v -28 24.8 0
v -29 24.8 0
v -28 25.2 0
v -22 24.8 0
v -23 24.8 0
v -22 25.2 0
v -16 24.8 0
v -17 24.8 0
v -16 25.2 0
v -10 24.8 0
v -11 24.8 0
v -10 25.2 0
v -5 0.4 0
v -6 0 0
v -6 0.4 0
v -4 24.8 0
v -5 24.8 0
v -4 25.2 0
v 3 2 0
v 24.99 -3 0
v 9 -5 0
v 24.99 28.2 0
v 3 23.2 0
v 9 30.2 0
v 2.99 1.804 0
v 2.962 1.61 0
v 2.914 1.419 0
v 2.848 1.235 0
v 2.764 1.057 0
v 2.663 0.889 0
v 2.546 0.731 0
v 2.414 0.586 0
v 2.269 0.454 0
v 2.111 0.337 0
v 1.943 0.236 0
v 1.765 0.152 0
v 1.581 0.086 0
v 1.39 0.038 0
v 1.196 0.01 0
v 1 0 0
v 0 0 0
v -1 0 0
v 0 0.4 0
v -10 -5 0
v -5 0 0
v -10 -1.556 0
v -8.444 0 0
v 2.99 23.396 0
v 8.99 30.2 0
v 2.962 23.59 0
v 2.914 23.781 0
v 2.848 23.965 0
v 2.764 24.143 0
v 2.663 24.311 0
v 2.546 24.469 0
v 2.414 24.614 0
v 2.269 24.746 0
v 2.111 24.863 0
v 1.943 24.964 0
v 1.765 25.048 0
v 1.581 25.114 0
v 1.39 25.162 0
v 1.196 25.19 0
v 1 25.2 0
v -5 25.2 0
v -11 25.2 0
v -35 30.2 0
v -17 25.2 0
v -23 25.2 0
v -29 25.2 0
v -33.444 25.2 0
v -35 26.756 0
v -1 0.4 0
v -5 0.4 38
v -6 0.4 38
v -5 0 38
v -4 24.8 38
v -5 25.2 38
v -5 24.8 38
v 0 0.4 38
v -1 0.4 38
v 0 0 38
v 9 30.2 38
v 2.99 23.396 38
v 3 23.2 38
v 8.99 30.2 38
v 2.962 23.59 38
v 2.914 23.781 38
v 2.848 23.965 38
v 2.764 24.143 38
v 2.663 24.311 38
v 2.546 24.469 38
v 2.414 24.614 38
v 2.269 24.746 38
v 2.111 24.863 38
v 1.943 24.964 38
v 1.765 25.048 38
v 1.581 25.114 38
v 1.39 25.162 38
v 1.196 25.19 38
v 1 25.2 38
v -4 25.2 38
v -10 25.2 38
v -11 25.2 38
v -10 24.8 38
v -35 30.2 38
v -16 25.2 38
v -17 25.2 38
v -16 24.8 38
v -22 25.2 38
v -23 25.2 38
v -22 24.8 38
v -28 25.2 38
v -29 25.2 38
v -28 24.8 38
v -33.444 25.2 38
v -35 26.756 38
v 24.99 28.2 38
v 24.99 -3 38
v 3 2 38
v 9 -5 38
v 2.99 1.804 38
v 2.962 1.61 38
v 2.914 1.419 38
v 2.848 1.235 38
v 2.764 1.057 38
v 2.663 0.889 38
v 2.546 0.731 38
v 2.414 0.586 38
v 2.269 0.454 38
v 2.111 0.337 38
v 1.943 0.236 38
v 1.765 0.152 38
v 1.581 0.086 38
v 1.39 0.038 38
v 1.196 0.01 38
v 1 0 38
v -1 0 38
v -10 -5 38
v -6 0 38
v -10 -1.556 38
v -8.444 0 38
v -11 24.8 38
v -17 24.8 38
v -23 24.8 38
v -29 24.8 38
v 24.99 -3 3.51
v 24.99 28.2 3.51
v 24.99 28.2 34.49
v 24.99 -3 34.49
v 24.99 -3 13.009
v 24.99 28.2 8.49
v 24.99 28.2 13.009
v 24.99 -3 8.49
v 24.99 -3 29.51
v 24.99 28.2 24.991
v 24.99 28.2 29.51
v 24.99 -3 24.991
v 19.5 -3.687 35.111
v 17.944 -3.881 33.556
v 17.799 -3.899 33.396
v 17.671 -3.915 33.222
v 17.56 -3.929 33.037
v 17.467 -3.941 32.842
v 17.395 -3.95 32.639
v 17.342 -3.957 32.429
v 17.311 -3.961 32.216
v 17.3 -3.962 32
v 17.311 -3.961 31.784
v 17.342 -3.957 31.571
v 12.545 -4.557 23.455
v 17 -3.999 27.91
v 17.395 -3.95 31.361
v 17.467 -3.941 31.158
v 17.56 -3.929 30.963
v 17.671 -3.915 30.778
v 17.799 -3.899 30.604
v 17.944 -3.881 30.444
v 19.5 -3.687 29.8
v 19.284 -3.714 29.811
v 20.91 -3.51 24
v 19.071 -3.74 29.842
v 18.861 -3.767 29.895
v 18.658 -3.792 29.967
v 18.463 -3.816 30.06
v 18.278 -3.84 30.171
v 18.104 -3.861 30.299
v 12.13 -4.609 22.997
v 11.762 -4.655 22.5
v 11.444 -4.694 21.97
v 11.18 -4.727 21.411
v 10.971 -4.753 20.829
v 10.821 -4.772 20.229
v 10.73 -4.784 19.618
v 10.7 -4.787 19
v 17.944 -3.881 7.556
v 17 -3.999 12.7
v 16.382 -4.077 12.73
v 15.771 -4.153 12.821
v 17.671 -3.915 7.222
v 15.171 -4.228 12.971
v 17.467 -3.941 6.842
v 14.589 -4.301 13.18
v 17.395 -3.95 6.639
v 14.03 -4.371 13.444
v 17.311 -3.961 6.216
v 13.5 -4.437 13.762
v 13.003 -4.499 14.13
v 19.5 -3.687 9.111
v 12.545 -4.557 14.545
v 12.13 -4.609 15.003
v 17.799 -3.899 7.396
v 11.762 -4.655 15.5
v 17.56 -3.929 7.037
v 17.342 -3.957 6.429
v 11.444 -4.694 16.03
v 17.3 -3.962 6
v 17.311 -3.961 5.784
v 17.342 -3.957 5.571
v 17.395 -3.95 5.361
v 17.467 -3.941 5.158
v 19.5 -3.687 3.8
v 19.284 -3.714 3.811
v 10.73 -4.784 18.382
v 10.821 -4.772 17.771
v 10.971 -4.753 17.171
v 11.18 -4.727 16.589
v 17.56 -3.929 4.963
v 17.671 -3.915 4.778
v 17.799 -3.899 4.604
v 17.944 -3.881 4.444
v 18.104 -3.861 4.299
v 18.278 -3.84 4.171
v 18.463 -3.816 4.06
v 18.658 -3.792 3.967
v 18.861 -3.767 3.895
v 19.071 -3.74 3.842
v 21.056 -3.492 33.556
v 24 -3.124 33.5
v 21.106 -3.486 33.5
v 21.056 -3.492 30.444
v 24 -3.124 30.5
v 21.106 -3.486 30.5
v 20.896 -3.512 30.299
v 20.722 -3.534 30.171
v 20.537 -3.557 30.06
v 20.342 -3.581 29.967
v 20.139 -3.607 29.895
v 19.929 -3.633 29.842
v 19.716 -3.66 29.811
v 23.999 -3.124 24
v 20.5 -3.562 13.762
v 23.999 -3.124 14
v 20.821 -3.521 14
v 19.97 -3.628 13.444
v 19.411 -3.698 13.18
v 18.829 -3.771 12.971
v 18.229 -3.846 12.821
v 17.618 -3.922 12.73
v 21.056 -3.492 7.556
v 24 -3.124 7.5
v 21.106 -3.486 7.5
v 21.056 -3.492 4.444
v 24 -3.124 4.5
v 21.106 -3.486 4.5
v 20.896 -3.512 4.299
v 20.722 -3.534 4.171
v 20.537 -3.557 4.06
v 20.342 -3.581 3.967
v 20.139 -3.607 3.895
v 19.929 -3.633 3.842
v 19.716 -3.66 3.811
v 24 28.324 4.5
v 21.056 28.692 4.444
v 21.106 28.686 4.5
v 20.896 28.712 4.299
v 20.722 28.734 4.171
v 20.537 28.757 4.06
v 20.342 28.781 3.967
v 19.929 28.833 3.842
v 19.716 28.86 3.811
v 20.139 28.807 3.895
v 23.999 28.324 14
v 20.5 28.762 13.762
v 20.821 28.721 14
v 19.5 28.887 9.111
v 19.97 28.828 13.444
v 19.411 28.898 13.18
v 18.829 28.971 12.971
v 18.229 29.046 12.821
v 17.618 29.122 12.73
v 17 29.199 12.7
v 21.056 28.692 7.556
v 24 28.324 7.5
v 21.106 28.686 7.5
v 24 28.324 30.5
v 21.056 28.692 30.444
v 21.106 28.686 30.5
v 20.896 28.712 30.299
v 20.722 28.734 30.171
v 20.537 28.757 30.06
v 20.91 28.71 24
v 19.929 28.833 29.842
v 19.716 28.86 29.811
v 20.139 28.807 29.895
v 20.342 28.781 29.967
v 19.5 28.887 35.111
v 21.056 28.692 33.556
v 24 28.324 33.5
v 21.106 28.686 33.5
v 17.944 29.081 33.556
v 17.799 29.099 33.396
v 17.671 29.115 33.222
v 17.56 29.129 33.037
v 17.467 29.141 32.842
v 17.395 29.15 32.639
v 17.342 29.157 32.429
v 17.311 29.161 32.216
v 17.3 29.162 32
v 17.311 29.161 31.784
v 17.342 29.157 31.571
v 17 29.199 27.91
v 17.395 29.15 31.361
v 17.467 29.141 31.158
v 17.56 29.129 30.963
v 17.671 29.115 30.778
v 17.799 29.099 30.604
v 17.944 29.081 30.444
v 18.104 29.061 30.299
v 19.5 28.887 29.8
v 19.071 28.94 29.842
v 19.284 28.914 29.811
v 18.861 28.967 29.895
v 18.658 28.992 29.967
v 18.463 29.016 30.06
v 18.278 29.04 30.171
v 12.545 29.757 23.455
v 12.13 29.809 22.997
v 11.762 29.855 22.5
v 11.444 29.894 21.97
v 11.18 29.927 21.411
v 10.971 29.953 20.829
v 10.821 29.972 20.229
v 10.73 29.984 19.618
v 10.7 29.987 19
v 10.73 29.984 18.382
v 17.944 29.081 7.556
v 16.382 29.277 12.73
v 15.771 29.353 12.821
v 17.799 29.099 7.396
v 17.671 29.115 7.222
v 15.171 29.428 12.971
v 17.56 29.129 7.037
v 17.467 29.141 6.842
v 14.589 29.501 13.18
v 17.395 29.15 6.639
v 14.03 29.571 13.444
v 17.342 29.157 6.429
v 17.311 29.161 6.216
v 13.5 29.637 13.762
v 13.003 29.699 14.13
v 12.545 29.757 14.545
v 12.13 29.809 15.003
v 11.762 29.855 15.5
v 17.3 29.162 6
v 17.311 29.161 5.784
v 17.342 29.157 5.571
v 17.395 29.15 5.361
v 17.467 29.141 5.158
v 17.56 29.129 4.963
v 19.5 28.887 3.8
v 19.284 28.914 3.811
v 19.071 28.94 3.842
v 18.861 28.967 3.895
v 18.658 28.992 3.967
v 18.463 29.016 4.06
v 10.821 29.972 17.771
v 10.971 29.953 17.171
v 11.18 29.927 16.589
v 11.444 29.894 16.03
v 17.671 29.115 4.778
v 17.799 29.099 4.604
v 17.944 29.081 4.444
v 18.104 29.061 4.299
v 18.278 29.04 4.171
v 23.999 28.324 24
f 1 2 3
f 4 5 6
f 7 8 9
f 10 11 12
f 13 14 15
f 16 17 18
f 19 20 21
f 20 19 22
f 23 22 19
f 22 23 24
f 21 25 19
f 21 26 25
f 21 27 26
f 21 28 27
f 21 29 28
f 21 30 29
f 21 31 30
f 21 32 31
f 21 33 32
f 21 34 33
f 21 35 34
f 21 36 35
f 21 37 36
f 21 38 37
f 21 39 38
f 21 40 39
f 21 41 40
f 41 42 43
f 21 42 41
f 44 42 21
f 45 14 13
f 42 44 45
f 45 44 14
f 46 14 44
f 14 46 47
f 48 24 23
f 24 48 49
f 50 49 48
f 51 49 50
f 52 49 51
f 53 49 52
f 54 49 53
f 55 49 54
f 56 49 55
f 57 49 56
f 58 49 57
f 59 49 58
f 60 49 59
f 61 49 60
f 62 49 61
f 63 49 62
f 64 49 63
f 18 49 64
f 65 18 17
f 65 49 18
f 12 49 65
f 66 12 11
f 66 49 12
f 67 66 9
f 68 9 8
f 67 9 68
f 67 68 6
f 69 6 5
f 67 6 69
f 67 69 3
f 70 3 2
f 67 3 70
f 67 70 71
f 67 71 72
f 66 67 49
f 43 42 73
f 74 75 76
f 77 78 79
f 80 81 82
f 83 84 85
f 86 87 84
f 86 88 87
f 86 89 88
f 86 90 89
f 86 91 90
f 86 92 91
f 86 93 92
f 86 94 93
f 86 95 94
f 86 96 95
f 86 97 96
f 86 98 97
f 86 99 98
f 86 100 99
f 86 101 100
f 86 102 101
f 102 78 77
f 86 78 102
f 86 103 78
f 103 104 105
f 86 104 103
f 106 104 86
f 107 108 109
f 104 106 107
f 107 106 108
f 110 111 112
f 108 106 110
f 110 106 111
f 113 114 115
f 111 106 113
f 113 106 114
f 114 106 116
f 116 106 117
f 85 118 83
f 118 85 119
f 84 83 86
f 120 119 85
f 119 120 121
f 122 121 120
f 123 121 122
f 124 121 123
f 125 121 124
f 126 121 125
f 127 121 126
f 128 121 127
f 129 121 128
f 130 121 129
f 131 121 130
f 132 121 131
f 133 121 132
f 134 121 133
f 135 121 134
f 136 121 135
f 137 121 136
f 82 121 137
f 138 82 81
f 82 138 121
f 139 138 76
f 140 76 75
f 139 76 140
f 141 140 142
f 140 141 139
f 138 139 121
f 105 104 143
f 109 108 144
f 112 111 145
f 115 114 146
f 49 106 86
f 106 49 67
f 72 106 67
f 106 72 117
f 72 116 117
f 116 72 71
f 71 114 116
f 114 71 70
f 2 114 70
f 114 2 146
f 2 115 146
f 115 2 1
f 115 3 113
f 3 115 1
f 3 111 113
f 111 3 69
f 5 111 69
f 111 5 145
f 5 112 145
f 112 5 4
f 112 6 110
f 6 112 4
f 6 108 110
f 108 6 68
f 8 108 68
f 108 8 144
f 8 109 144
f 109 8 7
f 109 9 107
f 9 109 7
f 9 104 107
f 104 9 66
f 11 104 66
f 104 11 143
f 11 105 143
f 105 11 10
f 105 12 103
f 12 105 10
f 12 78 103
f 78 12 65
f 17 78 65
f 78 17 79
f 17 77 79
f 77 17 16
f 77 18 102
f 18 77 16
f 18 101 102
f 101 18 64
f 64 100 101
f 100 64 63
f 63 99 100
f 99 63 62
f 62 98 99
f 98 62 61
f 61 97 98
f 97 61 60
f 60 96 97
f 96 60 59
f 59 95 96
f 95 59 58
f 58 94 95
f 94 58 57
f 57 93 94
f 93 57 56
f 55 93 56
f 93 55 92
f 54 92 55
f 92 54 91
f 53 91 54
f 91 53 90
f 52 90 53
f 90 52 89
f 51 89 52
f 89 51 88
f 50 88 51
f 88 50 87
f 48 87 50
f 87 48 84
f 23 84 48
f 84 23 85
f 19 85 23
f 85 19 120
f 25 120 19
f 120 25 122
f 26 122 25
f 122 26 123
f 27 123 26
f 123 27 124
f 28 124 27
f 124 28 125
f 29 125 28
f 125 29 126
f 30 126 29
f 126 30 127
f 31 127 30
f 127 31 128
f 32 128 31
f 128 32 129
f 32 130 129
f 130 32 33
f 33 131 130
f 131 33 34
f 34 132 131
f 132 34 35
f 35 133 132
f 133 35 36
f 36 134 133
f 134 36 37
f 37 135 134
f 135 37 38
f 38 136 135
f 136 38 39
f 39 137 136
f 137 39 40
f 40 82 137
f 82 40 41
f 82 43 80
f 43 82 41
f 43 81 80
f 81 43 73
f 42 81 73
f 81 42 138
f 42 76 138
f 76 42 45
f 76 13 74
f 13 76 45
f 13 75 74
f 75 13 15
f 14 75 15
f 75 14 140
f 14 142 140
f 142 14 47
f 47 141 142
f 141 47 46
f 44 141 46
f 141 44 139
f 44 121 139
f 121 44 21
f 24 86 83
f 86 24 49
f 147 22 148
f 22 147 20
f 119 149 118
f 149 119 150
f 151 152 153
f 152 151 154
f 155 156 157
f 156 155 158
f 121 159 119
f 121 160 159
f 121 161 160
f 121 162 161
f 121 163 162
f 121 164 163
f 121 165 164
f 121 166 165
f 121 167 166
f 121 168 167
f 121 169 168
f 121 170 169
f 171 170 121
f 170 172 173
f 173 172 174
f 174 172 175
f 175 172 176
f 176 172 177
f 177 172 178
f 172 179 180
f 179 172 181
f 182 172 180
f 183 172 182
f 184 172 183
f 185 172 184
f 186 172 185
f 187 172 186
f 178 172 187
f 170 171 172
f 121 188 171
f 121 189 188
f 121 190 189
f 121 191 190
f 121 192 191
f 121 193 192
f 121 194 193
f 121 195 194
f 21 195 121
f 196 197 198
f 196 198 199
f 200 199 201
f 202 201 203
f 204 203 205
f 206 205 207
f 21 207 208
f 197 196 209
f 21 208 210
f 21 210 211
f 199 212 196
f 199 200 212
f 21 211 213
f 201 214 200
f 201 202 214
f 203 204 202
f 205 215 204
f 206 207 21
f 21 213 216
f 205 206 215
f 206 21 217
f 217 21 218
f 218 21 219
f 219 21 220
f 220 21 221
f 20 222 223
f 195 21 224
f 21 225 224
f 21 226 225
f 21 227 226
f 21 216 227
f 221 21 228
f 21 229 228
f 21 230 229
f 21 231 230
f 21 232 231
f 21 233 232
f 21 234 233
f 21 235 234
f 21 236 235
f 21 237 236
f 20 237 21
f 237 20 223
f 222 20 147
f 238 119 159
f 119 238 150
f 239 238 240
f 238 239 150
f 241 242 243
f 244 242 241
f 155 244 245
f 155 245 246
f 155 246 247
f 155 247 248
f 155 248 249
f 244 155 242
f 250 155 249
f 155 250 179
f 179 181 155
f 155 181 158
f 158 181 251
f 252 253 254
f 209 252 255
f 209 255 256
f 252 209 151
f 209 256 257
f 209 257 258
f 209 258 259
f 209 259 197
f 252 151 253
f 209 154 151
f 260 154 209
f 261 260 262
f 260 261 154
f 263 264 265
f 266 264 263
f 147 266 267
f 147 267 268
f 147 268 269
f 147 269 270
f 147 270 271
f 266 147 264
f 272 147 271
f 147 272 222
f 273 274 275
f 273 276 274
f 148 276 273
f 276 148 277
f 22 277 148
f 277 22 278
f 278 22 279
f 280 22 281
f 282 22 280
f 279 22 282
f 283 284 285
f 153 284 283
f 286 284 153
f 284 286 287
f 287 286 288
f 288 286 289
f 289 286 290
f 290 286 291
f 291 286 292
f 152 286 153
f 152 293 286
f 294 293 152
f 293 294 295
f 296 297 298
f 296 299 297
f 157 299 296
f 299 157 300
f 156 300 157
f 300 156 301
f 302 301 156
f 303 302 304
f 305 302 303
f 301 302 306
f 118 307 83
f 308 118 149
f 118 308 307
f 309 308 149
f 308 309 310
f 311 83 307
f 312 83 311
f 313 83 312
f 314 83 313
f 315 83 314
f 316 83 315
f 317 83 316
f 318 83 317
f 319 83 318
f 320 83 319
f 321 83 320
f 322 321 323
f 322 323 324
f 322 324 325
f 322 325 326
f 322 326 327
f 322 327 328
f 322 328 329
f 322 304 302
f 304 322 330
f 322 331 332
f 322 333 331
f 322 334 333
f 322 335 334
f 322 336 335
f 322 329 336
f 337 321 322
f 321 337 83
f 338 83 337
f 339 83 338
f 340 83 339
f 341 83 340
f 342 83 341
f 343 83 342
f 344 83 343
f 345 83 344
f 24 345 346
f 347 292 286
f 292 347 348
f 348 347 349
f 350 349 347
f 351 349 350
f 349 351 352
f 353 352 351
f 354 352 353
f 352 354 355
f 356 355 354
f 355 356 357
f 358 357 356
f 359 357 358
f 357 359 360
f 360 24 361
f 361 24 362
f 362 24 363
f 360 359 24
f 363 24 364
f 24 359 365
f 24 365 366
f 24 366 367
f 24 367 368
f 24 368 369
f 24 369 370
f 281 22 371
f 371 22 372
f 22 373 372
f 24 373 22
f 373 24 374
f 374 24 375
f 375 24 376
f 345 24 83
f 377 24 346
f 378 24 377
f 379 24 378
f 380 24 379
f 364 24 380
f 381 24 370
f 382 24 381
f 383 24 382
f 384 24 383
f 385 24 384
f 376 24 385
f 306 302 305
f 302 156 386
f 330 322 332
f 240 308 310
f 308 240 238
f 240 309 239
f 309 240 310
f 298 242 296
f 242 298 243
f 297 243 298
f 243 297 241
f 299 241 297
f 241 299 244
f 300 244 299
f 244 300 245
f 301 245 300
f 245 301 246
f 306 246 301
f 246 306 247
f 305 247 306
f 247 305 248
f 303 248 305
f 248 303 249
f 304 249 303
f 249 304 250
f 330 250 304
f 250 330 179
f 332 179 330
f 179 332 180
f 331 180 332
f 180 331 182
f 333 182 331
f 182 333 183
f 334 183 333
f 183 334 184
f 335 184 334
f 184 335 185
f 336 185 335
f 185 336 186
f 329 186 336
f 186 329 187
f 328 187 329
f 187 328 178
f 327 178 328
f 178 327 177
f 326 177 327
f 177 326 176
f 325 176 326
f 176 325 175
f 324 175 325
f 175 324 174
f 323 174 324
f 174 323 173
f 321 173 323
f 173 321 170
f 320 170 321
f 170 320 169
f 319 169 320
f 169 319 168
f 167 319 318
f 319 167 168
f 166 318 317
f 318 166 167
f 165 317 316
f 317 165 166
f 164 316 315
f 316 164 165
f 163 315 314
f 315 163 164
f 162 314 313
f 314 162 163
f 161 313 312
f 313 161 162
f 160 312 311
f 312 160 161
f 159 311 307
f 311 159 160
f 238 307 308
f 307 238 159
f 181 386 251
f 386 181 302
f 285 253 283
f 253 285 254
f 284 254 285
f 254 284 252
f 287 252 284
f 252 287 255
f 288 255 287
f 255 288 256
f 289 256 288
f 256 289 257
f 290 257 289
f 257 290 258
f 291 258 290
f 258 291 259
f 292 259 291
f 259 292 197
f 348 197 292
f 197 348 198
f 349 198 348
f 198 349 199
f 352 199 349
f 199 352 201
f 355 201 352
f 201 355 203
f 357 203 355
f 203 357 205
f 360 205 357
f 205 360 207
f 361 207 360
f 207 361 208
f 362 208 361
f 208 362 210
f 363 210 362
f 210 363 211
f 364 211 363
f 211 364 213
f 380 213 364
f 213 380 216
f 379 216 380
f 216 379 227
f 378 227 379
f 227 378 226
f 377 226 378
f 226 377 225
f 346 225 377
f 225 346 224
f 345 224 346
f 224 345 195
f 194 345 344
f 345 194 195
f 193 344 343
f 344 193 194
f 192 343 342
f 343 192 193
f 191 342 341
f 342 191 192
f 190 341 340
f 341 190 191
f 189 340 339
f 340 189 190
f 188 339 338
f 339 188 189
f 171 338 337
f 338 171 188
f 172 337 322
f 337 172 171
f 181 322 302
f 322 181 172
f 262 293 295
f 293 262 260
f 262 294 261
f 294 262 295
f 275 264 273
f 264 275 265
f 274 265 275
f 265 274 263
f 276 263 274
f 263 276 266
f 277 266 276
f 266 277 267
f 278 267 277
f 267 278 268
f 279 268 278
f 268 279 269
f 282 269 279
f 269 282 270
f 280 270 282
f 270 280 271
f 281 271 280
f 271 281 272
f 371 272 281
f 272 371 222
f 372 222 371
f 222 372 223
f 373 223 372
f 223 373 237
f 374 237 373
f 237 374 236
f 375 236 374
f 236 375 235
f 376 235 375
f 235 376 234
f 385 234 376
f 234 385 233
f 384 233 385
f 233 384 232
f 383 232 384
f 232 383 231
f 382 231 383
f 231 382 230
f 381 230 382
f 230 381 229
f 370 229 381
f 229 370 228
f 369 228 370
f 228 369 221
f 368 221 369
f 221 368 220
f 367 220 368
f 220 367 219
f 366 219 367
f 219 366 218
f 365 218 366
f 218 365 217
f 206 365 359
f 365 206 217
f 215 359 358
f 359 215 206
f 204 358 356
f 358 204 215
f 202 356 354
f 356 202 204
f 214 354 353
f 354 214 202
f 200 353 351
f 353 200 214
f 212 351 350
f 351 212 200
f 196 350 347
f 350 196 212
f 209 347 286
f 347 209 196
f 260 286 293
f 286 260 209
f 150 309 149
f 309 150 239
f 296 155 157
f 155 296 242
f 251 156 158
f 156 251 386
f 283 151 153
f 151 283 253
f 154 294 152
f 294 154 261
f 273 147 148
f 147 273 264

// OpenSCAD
// Edge cable clip (2026-11-10, polished V1 = V2 built in). Pushes onto a tabletop edge
// (no tape, no screws): spring C-clamp with 0.8 mm preload, chamfered jaw tips to slide on,
// grip ribs inside, 2 mm inner fillets (PLA corner strength). Snap-in channels on the outside
// hold the cables where they drop over the edge; the plugs can't pass, so they stay on top.
// Default: 26 mm edge, 2 thin cables (USB-C, monitor) + 1 x 12 mm extension cord.
// Prints LYING ON ITS SIDE (C profile flat) so layers run around the C: no supports.
//   p3d slice edge_cable_clip.stl -f pla --walls 4 --infill 40 --keep-orient
$fn = 64;
part  = "print";   // "print" | "use" (as mounted)
T     = 26;        // edge thickness (calipers)
pre   = 0.8;       // clamp preload
jaw   = 5;         // jaw thickness
top_d = 35;        // top jaw reach onto the table
bot_d = 10;        // bottom jaw reach under the top
gap_x = 3;         // clearance in front of the (rounded) edge
sp    = 6;         // spine thickness
small = 4.4;  small_in = 3.0;    // thin cable channel / snap opening
big   = 12.6; big_in   = 10.0;   // extension cord channel / snap opening
W     = 38;        // clip width along the edge
blk   = 16;        // channel block depth

G  = T - pre;            // jaw gap
x0 = gap_x;              // spine inner face
x1 = x0 + sp;            // spine outer face
x2 = x1 + blk;           // channel block front
zb = -jaw; zt = G + jaw; // overall z
chans = [[small, small_in, 6], [big, big_in, W / 2], [small, small_in, W - 6]];

module c_profile() {     // XZ profile, extruded along Y
    difference() {
        union() {
            translate([-top_d, G]) square([top_d + x1, jaw]);
            translate([x0, zb]) square([sp, zt - zb]);
            translate([-bot_d, zb]) square([bot_d + x1, jaw]);
            // inner fillets
            for (z = [G, 0]) translate([x0 - 2, z == G ? G - 2 : 0]) square(2);
        }
        for (z = [G - 2, 2]) translate([x0 - 2, z]) circle(r = 2);
        // chamfered jaw tips (slide-on lead-in)
        translate([-top_d, G]) rotate(45) square(2.2, center = true);
        translate([-bot_d, 0]) rotate(45) square(2.2, center = true);
    }
    // grip ribs
    for (x = [-top_d + 6 : 6 : x0 - 4]) translate([x, G - 0.4]) square([1, 0.41]);
    for (x = [-bot_d + 4 : 5 : x0 - 4]) translate([x, -0.01]) square([1, 0.41]);
}

module channel(d, opening) {   // XY cross-section, axis Z; teardrop to +Y
    union() {
        circle(d = d);
        rotate(45) square(d / 2);                          // 45 deg teardrop tip toward +Y
        translate([0, -opening / 2]) square([blk, opening]);  // snap slot to the front (+X)
    }
}

module clip() {
    difference() {
        union() {
            rotate([90, 0, 0]) translate([0, 0, -W]) linear_extrude(W) c_profile();
            // channel block on the spine, chamfered top/bottom
            hull() {
                translate([x1 - 0.01, 0, zb + 2]) cube([blk, W, zt - zb - 4]);
                translate([x1 - 0.01, 0, zb]) cube([0.01, W, zt - zb]);
            }
        }
        for (c = chans)
            translate([x2 - blk / 2 - (c[0] > 6 ? 0 : -2.5), c[2], zb - 1])
                linear_extrude(zt - zb + 2) mirror([0, 1]) channel(c[0], c[1]);   // tip to -Y = print up
        // lead-in chamfers on the snap slots
        for (c = chans)
            translate([x2, c[2], (zt + zb) / 2]) rotate(45)
                cube([(c[1] + 2) / 1.414, (c[1] + 2) / 1.414, zt - zb + 2], center = true);
    }
}

if (part == "use") clip();
else rotate([-90, 0, 0]) translate([0, -W, 0]) clip();   // edge-direction (Y) becomes print Z
